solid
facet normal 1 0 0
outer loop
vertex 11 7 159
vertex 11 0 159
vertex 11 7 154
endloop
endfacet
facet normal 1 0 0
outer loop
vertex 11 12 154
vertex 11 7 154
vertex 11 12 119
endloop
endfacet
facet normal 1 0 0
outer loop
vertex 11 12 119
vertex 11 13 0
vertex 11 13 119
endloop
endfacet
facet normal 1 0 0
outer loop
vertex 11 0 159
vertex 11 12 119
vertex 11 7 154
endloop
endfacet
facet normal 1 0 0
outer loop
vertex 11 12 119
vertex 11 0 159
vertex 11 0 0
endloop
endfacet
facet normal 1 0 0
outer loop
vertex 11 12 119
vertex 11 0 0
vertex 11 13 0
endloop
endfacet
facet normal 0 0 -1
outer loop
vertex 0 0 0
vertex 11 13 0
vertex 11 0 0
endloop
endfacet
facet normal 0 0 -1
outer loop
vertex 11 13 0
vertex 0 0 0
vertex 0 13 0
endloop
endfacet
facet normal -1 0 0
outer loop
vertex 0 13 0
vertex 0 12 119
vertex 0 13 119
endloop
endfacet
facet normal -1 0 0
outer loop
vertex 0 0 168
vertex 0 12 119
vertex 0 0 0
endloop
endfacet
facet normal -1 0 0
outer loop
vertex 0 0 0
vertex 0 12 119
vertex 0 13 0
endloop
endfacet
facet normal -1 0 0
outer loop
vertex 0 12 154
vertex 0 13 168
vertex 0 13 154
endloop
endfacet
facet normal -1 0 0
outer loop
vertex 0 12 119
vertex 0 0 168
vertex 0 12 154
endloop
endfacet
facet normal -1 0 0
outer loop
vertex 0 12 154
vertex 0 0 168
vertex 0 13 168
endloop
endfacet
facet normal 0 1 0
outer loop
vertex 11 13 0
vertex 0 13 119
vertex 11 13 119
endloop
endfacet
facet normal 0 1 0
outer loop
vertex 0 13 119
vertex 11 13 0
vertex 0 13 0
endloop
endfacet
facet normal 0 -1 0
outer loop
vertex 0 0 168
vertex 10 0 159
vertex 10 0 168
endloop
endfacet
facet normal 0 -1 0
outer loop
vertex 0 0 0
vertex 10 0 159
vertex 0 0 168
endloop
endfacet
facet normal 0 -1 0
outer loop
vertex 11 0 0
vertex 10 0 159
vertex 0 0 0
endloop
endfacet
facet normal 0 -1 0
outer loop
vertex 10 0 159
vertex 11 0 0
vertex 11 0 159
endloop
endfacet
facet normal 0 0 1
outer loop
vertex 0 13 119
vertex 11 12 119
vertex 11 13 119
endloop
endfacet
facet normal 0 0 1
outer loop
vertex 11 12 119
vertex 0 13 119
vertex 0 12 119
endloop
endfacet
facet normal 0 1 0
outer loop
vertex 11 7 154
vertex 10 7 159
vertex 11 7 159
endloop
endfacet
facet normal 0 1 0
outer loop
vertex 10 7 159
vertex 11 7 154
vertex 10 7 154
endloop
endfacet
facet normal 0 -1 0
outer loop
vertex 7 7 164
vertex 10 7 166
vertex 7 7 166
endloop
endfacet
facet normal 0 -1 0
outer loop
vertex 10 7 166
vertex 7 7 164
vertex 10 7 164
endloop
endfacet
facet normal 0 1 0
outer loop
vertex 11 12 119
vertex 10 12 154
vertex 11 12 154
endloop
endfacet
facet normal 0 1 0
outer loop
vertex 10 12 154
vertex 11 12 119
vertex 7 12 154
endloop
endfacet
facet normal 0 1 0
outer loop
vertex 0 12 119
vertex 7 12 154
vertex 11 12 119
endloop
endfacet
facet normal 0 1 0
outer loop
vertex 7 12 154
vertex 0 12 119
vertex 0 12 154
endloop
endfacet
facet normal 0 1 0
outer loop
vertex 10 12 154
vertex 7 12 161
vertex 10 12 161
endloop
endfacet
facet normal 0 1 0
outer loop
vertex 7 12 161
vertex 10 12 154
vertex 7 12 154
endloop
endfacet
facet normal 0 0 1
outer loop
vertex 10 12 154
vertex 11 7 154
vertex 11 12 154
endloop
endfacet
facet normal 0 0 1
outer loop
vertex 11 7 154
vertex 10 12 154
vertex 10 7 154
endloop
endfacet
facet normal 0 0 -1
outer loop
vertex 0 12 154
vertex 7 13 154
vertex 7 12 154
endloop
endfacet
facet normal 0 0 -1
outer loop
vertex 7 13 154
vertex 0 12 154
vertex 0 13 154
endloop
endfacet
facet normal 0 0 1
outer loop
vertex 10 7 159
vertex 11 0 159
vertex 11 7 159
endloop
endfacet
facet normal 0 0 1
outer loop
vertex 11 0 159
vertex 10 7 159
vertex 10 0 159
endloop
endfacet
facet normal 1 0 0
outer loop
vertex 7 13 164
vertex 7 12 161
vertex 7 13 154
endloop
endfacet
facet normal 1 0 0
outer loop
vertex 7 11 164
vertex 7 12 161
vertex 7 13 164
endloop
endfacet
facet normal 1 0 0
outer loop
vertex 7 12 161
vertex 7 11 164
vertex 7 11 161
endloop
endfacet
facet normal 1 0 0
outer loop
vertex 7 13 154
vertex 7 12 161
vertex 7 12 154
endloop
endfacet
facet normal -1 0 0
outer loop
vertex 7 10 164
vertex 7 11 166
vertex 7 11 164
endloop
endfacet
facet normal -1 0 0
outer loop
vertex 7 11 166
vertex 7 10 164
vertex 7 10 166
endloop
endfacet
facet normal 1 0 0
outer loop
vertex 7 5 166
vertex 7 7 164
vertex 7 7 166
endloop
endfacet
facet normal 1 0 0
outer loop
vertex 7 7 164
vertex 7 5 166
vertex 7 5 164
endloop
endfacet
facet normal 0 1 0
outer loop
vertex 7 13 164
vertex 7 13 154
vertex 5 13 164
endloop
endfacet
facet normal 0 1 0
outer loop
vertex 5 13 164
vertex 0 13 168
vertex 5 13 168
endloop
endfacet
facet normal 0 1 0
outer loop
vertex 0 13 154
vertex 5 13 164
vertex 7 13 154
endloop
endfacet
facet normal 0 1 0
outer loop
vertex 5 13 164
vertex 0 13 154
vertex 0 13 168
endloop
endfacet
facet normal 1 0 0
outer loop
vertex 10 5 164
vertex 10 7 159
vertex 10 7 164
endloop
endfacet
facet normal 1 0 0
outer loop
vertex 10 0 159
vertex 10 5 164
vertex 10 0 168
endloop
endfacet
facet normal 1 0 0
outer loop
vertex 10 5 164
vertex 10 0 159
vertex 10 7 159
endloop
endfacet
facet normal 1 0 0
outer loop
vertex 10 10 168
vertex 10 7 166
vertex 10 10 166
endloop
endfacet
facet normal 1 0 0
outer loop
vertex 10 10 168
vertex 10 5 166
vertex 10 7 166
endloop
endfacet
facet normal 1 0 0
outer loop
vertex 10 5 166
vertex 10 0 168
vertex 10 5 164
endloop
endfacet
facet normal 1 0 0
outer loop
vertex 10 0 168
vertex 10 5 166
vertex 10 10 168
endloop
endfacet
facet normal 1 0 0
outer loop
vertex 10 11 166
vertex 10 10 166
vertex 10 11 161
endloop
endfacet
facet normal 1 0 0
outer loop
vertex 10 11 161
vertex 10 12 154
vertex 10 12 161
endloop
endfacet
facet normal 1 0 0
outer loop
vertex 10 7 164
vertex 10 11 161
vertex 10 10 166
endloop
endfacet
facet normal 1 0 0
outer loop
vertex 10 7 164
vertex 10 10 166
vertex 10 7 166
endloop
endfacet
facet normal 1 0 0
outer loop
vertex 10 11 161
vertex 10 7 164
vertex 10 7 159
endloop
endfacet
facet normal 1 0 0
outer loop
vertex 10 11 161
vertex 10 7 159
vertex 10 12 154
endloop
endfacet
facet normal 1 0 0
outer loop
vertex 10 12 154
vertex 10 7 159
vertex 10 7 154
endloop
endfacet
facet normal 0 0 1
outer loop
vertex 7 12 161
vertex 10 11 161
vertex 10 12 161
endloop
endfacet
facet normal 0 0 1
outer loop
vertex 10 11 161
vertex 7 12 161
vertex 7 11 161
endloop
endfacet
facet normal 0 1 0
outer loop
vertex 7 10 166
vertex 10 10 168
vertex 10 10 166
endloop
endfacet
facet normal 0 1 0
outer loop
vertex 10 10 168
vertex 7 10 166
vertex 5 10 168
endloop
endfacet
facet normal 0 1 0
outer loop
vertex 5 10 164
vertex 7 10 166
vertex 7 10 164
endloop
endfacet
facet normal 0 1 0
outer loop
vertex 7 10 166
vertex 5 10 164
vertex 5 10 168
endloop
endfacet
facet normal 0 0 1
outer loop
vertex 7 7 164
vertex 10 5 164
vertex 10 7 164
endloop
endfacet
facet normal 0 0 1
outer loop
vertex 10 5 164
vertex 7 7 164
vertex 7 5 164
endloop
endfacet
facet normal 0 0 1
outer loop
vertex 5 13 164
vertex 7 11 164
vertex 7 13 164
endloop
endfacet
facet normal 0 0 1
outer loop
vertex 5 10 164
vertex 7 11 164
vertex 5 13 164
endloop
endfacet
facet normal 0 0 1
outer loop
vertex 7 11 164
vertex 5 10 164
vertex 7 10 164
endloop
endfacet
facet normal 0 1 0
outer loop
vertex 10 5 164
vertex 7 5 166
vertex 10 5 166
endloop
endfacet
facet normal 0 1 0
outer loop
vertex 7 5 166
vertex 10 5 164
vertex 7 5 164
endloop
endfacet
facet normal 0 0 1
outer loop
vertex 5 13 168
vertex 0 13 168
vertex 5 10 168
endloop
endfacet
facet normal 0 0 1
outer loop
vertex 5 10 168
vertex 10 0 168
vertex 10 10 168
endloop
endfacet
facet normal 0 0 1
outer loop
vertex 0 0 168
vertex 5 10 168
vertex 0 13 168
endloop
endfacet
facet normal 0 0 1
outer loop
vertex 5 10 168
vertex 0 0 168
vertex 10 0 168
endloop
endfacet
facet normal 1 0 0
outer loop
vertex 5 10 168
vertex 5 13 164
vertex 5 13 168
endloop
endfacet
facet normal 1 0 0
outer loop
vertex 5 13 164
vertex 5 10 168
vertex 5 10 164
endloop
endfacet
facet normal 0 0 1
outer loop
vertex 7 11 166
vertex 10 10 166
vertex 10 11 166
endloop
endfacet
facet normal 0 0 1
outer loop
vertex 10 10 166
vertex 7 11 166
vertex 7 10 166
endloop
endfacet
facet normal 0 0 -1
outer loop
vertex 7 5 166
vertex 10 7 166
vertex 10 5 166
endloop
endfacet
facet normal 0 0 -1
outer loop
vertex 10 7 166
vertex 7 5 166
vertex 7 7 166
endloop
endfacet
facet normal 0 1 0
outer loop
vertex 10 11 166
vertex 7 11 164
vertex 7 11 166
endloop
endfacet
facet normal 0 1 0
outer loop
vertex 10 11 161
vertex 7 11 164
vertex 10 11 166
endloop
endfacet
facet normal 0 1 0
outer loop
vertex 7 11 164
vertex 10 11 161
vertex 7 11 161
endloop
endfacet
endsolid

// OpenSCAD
translate([5.5, 6.5, 3.5]) color([0.5230502317000981, 0.07086288409434749, 0.4031691464450935]) cube([11, 13, 7], center=true);
translate([5.5, 6.5, 10.5]) color([0.3285207100154869, 0.4147216089714424, 0.09940033823870109]) cube([11, 13, 7], center=true);
translate([5.5, 6.5, 17.5]) color([0.9086575543967805, 0.4740046511372964, 0.8408483326276716]) cube([11, 13, 7], center=true);
translate([5.5, 6.5, 24.5]) color([0.976229457649057, 0.34365159365776776, 0.4790865191519861]) cube([11, 13, 7], center=true);
translate([5.5, 6.5, 31.5]) color([0.6995952911506185, 0.42653532354402823, 0.30190311621935595]) cube([11, 13, 7], center=true);
translate([5.5, 6.5, 38.5]) color([0.7347509912186152, 0.8943997782145745, 0.9196888444316101]) cube([11, 13, 7], center=true);
translate([5.5, 6.5, 45.5]) color([0.6267420468068673, 0.3755713463285453, 0.9745605214796941]) cube([11, 13, 7], center=true);
translate([5.5, 6.5, 52.5]) color([0.6388785175004733, 0.06583467727730097, 0.08466956912011114]) cube([11, 13, 7], center=true);
translate([5.5, 6.5, 59.5]) color([0.749869571783086, 0.06115615654596607, 0.007851005331251826]) cube([11, 13, 7], center=true);
translate([5.5, 6.5, 66.5]) color([0.39380795178170946, 0.5190037287013293, 0.44854428559655457]) cube([11, 13, 7], center=true);
translate([5.5, 6.5, 73.5]) color([0.48861880442715255, 0.5848887019932744, 0.6793025673721249]) cube([11, 13, 7], center=true);
translate([5.5, 6.5, 80.5]) color([0.4230380735074225, 0.3683314563344259, 0.9884590580992895]) cube([11, 13, 7], center=true);
translate([5.5, 6.5, 87.5]) color([0.26091653544625626, 0.7771001545085096, 0.43122102463204415]) cube([11, 13, 7], center=true);
translate([5.5, 6.5, 94.5]) color([0.35852038200953895, 0.06385794894382868, 0.8635789443020424]) cube([11, 13, 7], center=true);
translate([5.5, 6.5, 101.5]) color([0.7020041497619371, 0.9030107075409272, 0.4516117926868677]) cube([11, 13, 7], center=true);
translate([5.5, 6.5, 108.5]) color([0.6769209668166035, 0.11891028655385572, 0.3979536016023134]) cube([11, 13, 7], center=true);
translate([5.5, 6.5, 115.5]) color([0.20723197341708288, 0.04210142789066196, 0.94796135125632]) cube([11, 13, 7], center=true);
translate([5.5, 3.5, 121.5]) color([0.21589436846535714, 0.1463544898080057, 0.19797004355794223]) cube([11, 7, 5], center=true);
translate([5.5, 9.5, 122.5]) color([0.37803196431429753, 0.5463912623151137, 0.15133436847289106]) cube([11, 5, 7], center=true);
translate([5.5, 3.5, 126.5]) color([0.9886898889857565, 0.9829892105452821, 0.14840201708602985]) cube([11, 7, 5], center=true);
translate([5.5, 9.5, 129.5]) color([0.4059068831679489, 0.6799294831100022, 0.8776565829010952]) cube([11, 5, 7], center=true);
translate([5.5, 3.5, 131.5]) color([0.49540592491118873, 0.9170466727598151, 0.3224603148813061]) cube([11, 7, 5], center=true);
translate([5.5, 3.5, 136.5]) color([0.4984408914907503, 0.4986465918650089, 0.6700681513152942]) cube([11, 7, 5], center=true);
translate([5.5, 9.5, 136.5]) color([0.2019913087994536, 0.6097706104167804, 0.21877309687215574]) cube([11, 5, 7], center=true);
translate([5.5, 3.5, 141.5]) color([0.340220315051032, 0.9625664632546818, 0.8990080380310076]) cube([11, 7, 5], center=true);
translate([5.5, 9.5, 143.5]) color([0.8181183809177941, 0.035468261876012264, 0.14836688246192975]) cube([11, 5, 7], center=true);
translate([5.5, 3.5, 146.5]) color([0.2568819120719038, 0.7841665681891542, 0.8423333270773672]) cube([11, 7, 5], center=true);
translate([5.5, 3.5, 151.5]) color([0.5829481802462215, 0.7181316517768294, 0.8070553799750758]) cube([11, 7, 5], center=true);
translate([5.5, 9.5, 150.5]) color([0.06635913103778524, 0.08464313683307012, 0.8688953140043785]) cube([11, 5, 7], center=true);
translate([5.5, 3.5, 156.5]) color([0.03941582937802879, 0.22509065367649606, 0.04063202664590093]) cube([11, 7, 5], center=true);
translate([3.5, 8.5, 156.5]) color([0.015285139969726802, 0.8439546856924078, 0.3305943672500803]) cube([7, 3, 5], center=true);
translate([3.5, 11.5, 156.5]) color([0.1606900602627206, 0.1488194902889095, 0.656083661770337]) cube([7, 3, 5], center=true);
translate([8.5, 9.5, 157.5]) color([0.9685982716927071, 0.5049996926056783, 0.9010904768840049]) cube([3, 5, 7], center=true);
translate([3.5, 2.5, 160.5]) color([0.5024285989524275, 0.5738724774915492, 0.6785713567893591]) cube([7, 5, 3], center=true);
translate([3.5, 7.5, 160.5]) color([0.805109989032137, 0.7578463822613826, 0.9905325627055622]) cube([7, 5, 3], center=true);
translate([8.5, 3.5, 161.5]) color([0.7469653891501328, 0.9057807233528663, 0.20610483206558328]) cube([3, 7, 5], center=true);
translate([3.5, 11.5, 161.5]) color([0.535416304328581, 0.5986142636674691, 0.8256966171603538]) cube([7, 3, 5], center=true);
translate([3.5, 2.5, 163.5]) color([0.4822135630659161, 0.7910402117090956, 0.3885688901501142]) cube([7, 5, 3], center=true);
translate([3.5, 7.5, 163.5]) color([0.5863884555814496, 0.8513166074810679, 0.7980594711041583]) cube([7, 5, 3], center=true);
translate([3.5, 2.5, 166.5]) color([0.6569845518861341, 0.00024069652516689466, 0.18196892218621108]) cube([7, 5, 3], center=true);
translate([3.5, 7.5, 166.5]) color([0.5068577868511277, 0.2544593984833793, 0.06562084327273077]) cube([7, 5, 3], center=true);
translate([8.5, 2.5, 165.0]) color([0.8598834221214616, 0.9429470213131631, 0.3028048781490337]) cube([3, 5, 2], center=true);
translate([8.5, 2.5, 167.0]) color([0.40807316738486077, 0.8100375338172869, 0.06225875887122312]) cube([3, 5, 2], center=true);
translate([2.5, 11.5, 165.0]) color([0.6409848625624502, 0.12732081293278708, 0.2870883399952252]) cube([5, 3, 2], center=true);
translate([8.5, 8.0, 163.5]) color([0.829940686628406, 0.0555270458896614, 0.035933833430188966]) cube([3, 2, 5], center=true);
translate([2.5, 11.5, 167.0]) color([0.4178660447962945, 0.49183095909626395, 0.8633251831082008]) cube([5, 3, 2], center=true);
translate([8.5, 10.0, 163.5]) color([0.7171887463451895, 0.6735438085995347, 0.15137377239978678]) cube([3, 2, 5], center=true);
translate([8.5, 7.5, 167.0]) color([0.9867059242186832, 0.41114019628748133, 0.6117708643248599]) cube([3, 5, 2], center=true);
